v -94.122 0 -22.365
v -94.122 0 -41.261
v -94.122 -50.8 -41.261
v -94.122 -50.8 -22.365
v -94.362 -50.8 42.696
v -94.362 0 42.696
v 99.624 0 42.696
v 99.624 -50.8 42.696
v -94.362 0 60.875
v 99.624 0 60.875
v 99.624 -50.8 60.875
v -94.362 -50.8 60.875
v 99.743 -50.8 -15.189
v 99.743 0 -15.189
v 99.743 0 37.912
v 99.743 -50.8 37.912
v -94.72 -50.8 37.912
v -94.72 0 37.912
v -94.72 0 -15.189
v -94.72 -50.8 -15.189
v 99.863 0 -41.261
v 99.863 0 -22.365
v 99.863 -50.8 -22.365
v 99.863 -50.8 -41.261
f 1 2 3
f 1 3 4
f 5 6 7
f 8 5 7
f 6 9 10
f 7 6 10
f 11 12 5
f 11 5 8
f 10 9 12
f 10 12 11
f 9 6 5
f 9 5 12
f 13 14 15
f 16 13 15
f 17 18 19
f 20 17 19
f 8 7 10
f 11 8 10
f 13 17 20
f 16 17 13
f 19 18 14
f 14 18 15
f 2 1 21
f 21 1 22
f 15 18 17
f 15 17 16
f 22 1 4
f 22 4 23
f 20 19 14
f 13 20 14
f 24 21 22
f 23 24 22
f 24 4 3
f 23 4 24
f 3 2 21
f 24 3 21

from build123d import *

# Parameters (mm, degrees)
F0_W     = 194.4637596607
F0_H     = 15.188745223
F0_H_2   = 11.0028702766
F0_H_3   = 26.909193024
F1_DEPTH = 50.8
F2_W     = 193.9853802323
F2_H     = 18.178652972
F3_DEPTH = 50.8
F2_W_2   = 193.9853876829
F2_H_2   = 18.8962351531


with BuildPart() as f1:
    # F0 (on Front) → F1 (new body)
    with BuildSketch(Plane.XZ):
        with Locations((2.511523664, -7.5943726115)):
            Rectangle(F0_W, F0_H)
        with Locations((2.511523664, 32.4106281623)):
            Rectangle(F0_W, F0_H_2)
        with Locations((2.511523664, 13.454596512)):
            Rectangle(F0_W, F0_H_3)
    extrude(amount=F1_DEPTH)


with BuildPart() as f3:
    # F2 (on Front) → F3 (new body)
    with BuildSketch(Plane.XZ):
        with Locations((2.6311166584, 51.7852474004)):
            Rectangle(F2_W, F2_H)
    extrude(amount=F3_DEPTH)


with BuildPart() as f3b:
    # F2 (on Front) → F3, piece 2 (new body)
    with BuildSketch(Plane.XZ):
        with Locations((2.8703138232, -31.8126464263)):
            Rectangle(F2_W_2, F2_H_2)
    extrude(amount=F3_DEPTH)


solid = Compound([f1.part, f3.part, f3b.part])
